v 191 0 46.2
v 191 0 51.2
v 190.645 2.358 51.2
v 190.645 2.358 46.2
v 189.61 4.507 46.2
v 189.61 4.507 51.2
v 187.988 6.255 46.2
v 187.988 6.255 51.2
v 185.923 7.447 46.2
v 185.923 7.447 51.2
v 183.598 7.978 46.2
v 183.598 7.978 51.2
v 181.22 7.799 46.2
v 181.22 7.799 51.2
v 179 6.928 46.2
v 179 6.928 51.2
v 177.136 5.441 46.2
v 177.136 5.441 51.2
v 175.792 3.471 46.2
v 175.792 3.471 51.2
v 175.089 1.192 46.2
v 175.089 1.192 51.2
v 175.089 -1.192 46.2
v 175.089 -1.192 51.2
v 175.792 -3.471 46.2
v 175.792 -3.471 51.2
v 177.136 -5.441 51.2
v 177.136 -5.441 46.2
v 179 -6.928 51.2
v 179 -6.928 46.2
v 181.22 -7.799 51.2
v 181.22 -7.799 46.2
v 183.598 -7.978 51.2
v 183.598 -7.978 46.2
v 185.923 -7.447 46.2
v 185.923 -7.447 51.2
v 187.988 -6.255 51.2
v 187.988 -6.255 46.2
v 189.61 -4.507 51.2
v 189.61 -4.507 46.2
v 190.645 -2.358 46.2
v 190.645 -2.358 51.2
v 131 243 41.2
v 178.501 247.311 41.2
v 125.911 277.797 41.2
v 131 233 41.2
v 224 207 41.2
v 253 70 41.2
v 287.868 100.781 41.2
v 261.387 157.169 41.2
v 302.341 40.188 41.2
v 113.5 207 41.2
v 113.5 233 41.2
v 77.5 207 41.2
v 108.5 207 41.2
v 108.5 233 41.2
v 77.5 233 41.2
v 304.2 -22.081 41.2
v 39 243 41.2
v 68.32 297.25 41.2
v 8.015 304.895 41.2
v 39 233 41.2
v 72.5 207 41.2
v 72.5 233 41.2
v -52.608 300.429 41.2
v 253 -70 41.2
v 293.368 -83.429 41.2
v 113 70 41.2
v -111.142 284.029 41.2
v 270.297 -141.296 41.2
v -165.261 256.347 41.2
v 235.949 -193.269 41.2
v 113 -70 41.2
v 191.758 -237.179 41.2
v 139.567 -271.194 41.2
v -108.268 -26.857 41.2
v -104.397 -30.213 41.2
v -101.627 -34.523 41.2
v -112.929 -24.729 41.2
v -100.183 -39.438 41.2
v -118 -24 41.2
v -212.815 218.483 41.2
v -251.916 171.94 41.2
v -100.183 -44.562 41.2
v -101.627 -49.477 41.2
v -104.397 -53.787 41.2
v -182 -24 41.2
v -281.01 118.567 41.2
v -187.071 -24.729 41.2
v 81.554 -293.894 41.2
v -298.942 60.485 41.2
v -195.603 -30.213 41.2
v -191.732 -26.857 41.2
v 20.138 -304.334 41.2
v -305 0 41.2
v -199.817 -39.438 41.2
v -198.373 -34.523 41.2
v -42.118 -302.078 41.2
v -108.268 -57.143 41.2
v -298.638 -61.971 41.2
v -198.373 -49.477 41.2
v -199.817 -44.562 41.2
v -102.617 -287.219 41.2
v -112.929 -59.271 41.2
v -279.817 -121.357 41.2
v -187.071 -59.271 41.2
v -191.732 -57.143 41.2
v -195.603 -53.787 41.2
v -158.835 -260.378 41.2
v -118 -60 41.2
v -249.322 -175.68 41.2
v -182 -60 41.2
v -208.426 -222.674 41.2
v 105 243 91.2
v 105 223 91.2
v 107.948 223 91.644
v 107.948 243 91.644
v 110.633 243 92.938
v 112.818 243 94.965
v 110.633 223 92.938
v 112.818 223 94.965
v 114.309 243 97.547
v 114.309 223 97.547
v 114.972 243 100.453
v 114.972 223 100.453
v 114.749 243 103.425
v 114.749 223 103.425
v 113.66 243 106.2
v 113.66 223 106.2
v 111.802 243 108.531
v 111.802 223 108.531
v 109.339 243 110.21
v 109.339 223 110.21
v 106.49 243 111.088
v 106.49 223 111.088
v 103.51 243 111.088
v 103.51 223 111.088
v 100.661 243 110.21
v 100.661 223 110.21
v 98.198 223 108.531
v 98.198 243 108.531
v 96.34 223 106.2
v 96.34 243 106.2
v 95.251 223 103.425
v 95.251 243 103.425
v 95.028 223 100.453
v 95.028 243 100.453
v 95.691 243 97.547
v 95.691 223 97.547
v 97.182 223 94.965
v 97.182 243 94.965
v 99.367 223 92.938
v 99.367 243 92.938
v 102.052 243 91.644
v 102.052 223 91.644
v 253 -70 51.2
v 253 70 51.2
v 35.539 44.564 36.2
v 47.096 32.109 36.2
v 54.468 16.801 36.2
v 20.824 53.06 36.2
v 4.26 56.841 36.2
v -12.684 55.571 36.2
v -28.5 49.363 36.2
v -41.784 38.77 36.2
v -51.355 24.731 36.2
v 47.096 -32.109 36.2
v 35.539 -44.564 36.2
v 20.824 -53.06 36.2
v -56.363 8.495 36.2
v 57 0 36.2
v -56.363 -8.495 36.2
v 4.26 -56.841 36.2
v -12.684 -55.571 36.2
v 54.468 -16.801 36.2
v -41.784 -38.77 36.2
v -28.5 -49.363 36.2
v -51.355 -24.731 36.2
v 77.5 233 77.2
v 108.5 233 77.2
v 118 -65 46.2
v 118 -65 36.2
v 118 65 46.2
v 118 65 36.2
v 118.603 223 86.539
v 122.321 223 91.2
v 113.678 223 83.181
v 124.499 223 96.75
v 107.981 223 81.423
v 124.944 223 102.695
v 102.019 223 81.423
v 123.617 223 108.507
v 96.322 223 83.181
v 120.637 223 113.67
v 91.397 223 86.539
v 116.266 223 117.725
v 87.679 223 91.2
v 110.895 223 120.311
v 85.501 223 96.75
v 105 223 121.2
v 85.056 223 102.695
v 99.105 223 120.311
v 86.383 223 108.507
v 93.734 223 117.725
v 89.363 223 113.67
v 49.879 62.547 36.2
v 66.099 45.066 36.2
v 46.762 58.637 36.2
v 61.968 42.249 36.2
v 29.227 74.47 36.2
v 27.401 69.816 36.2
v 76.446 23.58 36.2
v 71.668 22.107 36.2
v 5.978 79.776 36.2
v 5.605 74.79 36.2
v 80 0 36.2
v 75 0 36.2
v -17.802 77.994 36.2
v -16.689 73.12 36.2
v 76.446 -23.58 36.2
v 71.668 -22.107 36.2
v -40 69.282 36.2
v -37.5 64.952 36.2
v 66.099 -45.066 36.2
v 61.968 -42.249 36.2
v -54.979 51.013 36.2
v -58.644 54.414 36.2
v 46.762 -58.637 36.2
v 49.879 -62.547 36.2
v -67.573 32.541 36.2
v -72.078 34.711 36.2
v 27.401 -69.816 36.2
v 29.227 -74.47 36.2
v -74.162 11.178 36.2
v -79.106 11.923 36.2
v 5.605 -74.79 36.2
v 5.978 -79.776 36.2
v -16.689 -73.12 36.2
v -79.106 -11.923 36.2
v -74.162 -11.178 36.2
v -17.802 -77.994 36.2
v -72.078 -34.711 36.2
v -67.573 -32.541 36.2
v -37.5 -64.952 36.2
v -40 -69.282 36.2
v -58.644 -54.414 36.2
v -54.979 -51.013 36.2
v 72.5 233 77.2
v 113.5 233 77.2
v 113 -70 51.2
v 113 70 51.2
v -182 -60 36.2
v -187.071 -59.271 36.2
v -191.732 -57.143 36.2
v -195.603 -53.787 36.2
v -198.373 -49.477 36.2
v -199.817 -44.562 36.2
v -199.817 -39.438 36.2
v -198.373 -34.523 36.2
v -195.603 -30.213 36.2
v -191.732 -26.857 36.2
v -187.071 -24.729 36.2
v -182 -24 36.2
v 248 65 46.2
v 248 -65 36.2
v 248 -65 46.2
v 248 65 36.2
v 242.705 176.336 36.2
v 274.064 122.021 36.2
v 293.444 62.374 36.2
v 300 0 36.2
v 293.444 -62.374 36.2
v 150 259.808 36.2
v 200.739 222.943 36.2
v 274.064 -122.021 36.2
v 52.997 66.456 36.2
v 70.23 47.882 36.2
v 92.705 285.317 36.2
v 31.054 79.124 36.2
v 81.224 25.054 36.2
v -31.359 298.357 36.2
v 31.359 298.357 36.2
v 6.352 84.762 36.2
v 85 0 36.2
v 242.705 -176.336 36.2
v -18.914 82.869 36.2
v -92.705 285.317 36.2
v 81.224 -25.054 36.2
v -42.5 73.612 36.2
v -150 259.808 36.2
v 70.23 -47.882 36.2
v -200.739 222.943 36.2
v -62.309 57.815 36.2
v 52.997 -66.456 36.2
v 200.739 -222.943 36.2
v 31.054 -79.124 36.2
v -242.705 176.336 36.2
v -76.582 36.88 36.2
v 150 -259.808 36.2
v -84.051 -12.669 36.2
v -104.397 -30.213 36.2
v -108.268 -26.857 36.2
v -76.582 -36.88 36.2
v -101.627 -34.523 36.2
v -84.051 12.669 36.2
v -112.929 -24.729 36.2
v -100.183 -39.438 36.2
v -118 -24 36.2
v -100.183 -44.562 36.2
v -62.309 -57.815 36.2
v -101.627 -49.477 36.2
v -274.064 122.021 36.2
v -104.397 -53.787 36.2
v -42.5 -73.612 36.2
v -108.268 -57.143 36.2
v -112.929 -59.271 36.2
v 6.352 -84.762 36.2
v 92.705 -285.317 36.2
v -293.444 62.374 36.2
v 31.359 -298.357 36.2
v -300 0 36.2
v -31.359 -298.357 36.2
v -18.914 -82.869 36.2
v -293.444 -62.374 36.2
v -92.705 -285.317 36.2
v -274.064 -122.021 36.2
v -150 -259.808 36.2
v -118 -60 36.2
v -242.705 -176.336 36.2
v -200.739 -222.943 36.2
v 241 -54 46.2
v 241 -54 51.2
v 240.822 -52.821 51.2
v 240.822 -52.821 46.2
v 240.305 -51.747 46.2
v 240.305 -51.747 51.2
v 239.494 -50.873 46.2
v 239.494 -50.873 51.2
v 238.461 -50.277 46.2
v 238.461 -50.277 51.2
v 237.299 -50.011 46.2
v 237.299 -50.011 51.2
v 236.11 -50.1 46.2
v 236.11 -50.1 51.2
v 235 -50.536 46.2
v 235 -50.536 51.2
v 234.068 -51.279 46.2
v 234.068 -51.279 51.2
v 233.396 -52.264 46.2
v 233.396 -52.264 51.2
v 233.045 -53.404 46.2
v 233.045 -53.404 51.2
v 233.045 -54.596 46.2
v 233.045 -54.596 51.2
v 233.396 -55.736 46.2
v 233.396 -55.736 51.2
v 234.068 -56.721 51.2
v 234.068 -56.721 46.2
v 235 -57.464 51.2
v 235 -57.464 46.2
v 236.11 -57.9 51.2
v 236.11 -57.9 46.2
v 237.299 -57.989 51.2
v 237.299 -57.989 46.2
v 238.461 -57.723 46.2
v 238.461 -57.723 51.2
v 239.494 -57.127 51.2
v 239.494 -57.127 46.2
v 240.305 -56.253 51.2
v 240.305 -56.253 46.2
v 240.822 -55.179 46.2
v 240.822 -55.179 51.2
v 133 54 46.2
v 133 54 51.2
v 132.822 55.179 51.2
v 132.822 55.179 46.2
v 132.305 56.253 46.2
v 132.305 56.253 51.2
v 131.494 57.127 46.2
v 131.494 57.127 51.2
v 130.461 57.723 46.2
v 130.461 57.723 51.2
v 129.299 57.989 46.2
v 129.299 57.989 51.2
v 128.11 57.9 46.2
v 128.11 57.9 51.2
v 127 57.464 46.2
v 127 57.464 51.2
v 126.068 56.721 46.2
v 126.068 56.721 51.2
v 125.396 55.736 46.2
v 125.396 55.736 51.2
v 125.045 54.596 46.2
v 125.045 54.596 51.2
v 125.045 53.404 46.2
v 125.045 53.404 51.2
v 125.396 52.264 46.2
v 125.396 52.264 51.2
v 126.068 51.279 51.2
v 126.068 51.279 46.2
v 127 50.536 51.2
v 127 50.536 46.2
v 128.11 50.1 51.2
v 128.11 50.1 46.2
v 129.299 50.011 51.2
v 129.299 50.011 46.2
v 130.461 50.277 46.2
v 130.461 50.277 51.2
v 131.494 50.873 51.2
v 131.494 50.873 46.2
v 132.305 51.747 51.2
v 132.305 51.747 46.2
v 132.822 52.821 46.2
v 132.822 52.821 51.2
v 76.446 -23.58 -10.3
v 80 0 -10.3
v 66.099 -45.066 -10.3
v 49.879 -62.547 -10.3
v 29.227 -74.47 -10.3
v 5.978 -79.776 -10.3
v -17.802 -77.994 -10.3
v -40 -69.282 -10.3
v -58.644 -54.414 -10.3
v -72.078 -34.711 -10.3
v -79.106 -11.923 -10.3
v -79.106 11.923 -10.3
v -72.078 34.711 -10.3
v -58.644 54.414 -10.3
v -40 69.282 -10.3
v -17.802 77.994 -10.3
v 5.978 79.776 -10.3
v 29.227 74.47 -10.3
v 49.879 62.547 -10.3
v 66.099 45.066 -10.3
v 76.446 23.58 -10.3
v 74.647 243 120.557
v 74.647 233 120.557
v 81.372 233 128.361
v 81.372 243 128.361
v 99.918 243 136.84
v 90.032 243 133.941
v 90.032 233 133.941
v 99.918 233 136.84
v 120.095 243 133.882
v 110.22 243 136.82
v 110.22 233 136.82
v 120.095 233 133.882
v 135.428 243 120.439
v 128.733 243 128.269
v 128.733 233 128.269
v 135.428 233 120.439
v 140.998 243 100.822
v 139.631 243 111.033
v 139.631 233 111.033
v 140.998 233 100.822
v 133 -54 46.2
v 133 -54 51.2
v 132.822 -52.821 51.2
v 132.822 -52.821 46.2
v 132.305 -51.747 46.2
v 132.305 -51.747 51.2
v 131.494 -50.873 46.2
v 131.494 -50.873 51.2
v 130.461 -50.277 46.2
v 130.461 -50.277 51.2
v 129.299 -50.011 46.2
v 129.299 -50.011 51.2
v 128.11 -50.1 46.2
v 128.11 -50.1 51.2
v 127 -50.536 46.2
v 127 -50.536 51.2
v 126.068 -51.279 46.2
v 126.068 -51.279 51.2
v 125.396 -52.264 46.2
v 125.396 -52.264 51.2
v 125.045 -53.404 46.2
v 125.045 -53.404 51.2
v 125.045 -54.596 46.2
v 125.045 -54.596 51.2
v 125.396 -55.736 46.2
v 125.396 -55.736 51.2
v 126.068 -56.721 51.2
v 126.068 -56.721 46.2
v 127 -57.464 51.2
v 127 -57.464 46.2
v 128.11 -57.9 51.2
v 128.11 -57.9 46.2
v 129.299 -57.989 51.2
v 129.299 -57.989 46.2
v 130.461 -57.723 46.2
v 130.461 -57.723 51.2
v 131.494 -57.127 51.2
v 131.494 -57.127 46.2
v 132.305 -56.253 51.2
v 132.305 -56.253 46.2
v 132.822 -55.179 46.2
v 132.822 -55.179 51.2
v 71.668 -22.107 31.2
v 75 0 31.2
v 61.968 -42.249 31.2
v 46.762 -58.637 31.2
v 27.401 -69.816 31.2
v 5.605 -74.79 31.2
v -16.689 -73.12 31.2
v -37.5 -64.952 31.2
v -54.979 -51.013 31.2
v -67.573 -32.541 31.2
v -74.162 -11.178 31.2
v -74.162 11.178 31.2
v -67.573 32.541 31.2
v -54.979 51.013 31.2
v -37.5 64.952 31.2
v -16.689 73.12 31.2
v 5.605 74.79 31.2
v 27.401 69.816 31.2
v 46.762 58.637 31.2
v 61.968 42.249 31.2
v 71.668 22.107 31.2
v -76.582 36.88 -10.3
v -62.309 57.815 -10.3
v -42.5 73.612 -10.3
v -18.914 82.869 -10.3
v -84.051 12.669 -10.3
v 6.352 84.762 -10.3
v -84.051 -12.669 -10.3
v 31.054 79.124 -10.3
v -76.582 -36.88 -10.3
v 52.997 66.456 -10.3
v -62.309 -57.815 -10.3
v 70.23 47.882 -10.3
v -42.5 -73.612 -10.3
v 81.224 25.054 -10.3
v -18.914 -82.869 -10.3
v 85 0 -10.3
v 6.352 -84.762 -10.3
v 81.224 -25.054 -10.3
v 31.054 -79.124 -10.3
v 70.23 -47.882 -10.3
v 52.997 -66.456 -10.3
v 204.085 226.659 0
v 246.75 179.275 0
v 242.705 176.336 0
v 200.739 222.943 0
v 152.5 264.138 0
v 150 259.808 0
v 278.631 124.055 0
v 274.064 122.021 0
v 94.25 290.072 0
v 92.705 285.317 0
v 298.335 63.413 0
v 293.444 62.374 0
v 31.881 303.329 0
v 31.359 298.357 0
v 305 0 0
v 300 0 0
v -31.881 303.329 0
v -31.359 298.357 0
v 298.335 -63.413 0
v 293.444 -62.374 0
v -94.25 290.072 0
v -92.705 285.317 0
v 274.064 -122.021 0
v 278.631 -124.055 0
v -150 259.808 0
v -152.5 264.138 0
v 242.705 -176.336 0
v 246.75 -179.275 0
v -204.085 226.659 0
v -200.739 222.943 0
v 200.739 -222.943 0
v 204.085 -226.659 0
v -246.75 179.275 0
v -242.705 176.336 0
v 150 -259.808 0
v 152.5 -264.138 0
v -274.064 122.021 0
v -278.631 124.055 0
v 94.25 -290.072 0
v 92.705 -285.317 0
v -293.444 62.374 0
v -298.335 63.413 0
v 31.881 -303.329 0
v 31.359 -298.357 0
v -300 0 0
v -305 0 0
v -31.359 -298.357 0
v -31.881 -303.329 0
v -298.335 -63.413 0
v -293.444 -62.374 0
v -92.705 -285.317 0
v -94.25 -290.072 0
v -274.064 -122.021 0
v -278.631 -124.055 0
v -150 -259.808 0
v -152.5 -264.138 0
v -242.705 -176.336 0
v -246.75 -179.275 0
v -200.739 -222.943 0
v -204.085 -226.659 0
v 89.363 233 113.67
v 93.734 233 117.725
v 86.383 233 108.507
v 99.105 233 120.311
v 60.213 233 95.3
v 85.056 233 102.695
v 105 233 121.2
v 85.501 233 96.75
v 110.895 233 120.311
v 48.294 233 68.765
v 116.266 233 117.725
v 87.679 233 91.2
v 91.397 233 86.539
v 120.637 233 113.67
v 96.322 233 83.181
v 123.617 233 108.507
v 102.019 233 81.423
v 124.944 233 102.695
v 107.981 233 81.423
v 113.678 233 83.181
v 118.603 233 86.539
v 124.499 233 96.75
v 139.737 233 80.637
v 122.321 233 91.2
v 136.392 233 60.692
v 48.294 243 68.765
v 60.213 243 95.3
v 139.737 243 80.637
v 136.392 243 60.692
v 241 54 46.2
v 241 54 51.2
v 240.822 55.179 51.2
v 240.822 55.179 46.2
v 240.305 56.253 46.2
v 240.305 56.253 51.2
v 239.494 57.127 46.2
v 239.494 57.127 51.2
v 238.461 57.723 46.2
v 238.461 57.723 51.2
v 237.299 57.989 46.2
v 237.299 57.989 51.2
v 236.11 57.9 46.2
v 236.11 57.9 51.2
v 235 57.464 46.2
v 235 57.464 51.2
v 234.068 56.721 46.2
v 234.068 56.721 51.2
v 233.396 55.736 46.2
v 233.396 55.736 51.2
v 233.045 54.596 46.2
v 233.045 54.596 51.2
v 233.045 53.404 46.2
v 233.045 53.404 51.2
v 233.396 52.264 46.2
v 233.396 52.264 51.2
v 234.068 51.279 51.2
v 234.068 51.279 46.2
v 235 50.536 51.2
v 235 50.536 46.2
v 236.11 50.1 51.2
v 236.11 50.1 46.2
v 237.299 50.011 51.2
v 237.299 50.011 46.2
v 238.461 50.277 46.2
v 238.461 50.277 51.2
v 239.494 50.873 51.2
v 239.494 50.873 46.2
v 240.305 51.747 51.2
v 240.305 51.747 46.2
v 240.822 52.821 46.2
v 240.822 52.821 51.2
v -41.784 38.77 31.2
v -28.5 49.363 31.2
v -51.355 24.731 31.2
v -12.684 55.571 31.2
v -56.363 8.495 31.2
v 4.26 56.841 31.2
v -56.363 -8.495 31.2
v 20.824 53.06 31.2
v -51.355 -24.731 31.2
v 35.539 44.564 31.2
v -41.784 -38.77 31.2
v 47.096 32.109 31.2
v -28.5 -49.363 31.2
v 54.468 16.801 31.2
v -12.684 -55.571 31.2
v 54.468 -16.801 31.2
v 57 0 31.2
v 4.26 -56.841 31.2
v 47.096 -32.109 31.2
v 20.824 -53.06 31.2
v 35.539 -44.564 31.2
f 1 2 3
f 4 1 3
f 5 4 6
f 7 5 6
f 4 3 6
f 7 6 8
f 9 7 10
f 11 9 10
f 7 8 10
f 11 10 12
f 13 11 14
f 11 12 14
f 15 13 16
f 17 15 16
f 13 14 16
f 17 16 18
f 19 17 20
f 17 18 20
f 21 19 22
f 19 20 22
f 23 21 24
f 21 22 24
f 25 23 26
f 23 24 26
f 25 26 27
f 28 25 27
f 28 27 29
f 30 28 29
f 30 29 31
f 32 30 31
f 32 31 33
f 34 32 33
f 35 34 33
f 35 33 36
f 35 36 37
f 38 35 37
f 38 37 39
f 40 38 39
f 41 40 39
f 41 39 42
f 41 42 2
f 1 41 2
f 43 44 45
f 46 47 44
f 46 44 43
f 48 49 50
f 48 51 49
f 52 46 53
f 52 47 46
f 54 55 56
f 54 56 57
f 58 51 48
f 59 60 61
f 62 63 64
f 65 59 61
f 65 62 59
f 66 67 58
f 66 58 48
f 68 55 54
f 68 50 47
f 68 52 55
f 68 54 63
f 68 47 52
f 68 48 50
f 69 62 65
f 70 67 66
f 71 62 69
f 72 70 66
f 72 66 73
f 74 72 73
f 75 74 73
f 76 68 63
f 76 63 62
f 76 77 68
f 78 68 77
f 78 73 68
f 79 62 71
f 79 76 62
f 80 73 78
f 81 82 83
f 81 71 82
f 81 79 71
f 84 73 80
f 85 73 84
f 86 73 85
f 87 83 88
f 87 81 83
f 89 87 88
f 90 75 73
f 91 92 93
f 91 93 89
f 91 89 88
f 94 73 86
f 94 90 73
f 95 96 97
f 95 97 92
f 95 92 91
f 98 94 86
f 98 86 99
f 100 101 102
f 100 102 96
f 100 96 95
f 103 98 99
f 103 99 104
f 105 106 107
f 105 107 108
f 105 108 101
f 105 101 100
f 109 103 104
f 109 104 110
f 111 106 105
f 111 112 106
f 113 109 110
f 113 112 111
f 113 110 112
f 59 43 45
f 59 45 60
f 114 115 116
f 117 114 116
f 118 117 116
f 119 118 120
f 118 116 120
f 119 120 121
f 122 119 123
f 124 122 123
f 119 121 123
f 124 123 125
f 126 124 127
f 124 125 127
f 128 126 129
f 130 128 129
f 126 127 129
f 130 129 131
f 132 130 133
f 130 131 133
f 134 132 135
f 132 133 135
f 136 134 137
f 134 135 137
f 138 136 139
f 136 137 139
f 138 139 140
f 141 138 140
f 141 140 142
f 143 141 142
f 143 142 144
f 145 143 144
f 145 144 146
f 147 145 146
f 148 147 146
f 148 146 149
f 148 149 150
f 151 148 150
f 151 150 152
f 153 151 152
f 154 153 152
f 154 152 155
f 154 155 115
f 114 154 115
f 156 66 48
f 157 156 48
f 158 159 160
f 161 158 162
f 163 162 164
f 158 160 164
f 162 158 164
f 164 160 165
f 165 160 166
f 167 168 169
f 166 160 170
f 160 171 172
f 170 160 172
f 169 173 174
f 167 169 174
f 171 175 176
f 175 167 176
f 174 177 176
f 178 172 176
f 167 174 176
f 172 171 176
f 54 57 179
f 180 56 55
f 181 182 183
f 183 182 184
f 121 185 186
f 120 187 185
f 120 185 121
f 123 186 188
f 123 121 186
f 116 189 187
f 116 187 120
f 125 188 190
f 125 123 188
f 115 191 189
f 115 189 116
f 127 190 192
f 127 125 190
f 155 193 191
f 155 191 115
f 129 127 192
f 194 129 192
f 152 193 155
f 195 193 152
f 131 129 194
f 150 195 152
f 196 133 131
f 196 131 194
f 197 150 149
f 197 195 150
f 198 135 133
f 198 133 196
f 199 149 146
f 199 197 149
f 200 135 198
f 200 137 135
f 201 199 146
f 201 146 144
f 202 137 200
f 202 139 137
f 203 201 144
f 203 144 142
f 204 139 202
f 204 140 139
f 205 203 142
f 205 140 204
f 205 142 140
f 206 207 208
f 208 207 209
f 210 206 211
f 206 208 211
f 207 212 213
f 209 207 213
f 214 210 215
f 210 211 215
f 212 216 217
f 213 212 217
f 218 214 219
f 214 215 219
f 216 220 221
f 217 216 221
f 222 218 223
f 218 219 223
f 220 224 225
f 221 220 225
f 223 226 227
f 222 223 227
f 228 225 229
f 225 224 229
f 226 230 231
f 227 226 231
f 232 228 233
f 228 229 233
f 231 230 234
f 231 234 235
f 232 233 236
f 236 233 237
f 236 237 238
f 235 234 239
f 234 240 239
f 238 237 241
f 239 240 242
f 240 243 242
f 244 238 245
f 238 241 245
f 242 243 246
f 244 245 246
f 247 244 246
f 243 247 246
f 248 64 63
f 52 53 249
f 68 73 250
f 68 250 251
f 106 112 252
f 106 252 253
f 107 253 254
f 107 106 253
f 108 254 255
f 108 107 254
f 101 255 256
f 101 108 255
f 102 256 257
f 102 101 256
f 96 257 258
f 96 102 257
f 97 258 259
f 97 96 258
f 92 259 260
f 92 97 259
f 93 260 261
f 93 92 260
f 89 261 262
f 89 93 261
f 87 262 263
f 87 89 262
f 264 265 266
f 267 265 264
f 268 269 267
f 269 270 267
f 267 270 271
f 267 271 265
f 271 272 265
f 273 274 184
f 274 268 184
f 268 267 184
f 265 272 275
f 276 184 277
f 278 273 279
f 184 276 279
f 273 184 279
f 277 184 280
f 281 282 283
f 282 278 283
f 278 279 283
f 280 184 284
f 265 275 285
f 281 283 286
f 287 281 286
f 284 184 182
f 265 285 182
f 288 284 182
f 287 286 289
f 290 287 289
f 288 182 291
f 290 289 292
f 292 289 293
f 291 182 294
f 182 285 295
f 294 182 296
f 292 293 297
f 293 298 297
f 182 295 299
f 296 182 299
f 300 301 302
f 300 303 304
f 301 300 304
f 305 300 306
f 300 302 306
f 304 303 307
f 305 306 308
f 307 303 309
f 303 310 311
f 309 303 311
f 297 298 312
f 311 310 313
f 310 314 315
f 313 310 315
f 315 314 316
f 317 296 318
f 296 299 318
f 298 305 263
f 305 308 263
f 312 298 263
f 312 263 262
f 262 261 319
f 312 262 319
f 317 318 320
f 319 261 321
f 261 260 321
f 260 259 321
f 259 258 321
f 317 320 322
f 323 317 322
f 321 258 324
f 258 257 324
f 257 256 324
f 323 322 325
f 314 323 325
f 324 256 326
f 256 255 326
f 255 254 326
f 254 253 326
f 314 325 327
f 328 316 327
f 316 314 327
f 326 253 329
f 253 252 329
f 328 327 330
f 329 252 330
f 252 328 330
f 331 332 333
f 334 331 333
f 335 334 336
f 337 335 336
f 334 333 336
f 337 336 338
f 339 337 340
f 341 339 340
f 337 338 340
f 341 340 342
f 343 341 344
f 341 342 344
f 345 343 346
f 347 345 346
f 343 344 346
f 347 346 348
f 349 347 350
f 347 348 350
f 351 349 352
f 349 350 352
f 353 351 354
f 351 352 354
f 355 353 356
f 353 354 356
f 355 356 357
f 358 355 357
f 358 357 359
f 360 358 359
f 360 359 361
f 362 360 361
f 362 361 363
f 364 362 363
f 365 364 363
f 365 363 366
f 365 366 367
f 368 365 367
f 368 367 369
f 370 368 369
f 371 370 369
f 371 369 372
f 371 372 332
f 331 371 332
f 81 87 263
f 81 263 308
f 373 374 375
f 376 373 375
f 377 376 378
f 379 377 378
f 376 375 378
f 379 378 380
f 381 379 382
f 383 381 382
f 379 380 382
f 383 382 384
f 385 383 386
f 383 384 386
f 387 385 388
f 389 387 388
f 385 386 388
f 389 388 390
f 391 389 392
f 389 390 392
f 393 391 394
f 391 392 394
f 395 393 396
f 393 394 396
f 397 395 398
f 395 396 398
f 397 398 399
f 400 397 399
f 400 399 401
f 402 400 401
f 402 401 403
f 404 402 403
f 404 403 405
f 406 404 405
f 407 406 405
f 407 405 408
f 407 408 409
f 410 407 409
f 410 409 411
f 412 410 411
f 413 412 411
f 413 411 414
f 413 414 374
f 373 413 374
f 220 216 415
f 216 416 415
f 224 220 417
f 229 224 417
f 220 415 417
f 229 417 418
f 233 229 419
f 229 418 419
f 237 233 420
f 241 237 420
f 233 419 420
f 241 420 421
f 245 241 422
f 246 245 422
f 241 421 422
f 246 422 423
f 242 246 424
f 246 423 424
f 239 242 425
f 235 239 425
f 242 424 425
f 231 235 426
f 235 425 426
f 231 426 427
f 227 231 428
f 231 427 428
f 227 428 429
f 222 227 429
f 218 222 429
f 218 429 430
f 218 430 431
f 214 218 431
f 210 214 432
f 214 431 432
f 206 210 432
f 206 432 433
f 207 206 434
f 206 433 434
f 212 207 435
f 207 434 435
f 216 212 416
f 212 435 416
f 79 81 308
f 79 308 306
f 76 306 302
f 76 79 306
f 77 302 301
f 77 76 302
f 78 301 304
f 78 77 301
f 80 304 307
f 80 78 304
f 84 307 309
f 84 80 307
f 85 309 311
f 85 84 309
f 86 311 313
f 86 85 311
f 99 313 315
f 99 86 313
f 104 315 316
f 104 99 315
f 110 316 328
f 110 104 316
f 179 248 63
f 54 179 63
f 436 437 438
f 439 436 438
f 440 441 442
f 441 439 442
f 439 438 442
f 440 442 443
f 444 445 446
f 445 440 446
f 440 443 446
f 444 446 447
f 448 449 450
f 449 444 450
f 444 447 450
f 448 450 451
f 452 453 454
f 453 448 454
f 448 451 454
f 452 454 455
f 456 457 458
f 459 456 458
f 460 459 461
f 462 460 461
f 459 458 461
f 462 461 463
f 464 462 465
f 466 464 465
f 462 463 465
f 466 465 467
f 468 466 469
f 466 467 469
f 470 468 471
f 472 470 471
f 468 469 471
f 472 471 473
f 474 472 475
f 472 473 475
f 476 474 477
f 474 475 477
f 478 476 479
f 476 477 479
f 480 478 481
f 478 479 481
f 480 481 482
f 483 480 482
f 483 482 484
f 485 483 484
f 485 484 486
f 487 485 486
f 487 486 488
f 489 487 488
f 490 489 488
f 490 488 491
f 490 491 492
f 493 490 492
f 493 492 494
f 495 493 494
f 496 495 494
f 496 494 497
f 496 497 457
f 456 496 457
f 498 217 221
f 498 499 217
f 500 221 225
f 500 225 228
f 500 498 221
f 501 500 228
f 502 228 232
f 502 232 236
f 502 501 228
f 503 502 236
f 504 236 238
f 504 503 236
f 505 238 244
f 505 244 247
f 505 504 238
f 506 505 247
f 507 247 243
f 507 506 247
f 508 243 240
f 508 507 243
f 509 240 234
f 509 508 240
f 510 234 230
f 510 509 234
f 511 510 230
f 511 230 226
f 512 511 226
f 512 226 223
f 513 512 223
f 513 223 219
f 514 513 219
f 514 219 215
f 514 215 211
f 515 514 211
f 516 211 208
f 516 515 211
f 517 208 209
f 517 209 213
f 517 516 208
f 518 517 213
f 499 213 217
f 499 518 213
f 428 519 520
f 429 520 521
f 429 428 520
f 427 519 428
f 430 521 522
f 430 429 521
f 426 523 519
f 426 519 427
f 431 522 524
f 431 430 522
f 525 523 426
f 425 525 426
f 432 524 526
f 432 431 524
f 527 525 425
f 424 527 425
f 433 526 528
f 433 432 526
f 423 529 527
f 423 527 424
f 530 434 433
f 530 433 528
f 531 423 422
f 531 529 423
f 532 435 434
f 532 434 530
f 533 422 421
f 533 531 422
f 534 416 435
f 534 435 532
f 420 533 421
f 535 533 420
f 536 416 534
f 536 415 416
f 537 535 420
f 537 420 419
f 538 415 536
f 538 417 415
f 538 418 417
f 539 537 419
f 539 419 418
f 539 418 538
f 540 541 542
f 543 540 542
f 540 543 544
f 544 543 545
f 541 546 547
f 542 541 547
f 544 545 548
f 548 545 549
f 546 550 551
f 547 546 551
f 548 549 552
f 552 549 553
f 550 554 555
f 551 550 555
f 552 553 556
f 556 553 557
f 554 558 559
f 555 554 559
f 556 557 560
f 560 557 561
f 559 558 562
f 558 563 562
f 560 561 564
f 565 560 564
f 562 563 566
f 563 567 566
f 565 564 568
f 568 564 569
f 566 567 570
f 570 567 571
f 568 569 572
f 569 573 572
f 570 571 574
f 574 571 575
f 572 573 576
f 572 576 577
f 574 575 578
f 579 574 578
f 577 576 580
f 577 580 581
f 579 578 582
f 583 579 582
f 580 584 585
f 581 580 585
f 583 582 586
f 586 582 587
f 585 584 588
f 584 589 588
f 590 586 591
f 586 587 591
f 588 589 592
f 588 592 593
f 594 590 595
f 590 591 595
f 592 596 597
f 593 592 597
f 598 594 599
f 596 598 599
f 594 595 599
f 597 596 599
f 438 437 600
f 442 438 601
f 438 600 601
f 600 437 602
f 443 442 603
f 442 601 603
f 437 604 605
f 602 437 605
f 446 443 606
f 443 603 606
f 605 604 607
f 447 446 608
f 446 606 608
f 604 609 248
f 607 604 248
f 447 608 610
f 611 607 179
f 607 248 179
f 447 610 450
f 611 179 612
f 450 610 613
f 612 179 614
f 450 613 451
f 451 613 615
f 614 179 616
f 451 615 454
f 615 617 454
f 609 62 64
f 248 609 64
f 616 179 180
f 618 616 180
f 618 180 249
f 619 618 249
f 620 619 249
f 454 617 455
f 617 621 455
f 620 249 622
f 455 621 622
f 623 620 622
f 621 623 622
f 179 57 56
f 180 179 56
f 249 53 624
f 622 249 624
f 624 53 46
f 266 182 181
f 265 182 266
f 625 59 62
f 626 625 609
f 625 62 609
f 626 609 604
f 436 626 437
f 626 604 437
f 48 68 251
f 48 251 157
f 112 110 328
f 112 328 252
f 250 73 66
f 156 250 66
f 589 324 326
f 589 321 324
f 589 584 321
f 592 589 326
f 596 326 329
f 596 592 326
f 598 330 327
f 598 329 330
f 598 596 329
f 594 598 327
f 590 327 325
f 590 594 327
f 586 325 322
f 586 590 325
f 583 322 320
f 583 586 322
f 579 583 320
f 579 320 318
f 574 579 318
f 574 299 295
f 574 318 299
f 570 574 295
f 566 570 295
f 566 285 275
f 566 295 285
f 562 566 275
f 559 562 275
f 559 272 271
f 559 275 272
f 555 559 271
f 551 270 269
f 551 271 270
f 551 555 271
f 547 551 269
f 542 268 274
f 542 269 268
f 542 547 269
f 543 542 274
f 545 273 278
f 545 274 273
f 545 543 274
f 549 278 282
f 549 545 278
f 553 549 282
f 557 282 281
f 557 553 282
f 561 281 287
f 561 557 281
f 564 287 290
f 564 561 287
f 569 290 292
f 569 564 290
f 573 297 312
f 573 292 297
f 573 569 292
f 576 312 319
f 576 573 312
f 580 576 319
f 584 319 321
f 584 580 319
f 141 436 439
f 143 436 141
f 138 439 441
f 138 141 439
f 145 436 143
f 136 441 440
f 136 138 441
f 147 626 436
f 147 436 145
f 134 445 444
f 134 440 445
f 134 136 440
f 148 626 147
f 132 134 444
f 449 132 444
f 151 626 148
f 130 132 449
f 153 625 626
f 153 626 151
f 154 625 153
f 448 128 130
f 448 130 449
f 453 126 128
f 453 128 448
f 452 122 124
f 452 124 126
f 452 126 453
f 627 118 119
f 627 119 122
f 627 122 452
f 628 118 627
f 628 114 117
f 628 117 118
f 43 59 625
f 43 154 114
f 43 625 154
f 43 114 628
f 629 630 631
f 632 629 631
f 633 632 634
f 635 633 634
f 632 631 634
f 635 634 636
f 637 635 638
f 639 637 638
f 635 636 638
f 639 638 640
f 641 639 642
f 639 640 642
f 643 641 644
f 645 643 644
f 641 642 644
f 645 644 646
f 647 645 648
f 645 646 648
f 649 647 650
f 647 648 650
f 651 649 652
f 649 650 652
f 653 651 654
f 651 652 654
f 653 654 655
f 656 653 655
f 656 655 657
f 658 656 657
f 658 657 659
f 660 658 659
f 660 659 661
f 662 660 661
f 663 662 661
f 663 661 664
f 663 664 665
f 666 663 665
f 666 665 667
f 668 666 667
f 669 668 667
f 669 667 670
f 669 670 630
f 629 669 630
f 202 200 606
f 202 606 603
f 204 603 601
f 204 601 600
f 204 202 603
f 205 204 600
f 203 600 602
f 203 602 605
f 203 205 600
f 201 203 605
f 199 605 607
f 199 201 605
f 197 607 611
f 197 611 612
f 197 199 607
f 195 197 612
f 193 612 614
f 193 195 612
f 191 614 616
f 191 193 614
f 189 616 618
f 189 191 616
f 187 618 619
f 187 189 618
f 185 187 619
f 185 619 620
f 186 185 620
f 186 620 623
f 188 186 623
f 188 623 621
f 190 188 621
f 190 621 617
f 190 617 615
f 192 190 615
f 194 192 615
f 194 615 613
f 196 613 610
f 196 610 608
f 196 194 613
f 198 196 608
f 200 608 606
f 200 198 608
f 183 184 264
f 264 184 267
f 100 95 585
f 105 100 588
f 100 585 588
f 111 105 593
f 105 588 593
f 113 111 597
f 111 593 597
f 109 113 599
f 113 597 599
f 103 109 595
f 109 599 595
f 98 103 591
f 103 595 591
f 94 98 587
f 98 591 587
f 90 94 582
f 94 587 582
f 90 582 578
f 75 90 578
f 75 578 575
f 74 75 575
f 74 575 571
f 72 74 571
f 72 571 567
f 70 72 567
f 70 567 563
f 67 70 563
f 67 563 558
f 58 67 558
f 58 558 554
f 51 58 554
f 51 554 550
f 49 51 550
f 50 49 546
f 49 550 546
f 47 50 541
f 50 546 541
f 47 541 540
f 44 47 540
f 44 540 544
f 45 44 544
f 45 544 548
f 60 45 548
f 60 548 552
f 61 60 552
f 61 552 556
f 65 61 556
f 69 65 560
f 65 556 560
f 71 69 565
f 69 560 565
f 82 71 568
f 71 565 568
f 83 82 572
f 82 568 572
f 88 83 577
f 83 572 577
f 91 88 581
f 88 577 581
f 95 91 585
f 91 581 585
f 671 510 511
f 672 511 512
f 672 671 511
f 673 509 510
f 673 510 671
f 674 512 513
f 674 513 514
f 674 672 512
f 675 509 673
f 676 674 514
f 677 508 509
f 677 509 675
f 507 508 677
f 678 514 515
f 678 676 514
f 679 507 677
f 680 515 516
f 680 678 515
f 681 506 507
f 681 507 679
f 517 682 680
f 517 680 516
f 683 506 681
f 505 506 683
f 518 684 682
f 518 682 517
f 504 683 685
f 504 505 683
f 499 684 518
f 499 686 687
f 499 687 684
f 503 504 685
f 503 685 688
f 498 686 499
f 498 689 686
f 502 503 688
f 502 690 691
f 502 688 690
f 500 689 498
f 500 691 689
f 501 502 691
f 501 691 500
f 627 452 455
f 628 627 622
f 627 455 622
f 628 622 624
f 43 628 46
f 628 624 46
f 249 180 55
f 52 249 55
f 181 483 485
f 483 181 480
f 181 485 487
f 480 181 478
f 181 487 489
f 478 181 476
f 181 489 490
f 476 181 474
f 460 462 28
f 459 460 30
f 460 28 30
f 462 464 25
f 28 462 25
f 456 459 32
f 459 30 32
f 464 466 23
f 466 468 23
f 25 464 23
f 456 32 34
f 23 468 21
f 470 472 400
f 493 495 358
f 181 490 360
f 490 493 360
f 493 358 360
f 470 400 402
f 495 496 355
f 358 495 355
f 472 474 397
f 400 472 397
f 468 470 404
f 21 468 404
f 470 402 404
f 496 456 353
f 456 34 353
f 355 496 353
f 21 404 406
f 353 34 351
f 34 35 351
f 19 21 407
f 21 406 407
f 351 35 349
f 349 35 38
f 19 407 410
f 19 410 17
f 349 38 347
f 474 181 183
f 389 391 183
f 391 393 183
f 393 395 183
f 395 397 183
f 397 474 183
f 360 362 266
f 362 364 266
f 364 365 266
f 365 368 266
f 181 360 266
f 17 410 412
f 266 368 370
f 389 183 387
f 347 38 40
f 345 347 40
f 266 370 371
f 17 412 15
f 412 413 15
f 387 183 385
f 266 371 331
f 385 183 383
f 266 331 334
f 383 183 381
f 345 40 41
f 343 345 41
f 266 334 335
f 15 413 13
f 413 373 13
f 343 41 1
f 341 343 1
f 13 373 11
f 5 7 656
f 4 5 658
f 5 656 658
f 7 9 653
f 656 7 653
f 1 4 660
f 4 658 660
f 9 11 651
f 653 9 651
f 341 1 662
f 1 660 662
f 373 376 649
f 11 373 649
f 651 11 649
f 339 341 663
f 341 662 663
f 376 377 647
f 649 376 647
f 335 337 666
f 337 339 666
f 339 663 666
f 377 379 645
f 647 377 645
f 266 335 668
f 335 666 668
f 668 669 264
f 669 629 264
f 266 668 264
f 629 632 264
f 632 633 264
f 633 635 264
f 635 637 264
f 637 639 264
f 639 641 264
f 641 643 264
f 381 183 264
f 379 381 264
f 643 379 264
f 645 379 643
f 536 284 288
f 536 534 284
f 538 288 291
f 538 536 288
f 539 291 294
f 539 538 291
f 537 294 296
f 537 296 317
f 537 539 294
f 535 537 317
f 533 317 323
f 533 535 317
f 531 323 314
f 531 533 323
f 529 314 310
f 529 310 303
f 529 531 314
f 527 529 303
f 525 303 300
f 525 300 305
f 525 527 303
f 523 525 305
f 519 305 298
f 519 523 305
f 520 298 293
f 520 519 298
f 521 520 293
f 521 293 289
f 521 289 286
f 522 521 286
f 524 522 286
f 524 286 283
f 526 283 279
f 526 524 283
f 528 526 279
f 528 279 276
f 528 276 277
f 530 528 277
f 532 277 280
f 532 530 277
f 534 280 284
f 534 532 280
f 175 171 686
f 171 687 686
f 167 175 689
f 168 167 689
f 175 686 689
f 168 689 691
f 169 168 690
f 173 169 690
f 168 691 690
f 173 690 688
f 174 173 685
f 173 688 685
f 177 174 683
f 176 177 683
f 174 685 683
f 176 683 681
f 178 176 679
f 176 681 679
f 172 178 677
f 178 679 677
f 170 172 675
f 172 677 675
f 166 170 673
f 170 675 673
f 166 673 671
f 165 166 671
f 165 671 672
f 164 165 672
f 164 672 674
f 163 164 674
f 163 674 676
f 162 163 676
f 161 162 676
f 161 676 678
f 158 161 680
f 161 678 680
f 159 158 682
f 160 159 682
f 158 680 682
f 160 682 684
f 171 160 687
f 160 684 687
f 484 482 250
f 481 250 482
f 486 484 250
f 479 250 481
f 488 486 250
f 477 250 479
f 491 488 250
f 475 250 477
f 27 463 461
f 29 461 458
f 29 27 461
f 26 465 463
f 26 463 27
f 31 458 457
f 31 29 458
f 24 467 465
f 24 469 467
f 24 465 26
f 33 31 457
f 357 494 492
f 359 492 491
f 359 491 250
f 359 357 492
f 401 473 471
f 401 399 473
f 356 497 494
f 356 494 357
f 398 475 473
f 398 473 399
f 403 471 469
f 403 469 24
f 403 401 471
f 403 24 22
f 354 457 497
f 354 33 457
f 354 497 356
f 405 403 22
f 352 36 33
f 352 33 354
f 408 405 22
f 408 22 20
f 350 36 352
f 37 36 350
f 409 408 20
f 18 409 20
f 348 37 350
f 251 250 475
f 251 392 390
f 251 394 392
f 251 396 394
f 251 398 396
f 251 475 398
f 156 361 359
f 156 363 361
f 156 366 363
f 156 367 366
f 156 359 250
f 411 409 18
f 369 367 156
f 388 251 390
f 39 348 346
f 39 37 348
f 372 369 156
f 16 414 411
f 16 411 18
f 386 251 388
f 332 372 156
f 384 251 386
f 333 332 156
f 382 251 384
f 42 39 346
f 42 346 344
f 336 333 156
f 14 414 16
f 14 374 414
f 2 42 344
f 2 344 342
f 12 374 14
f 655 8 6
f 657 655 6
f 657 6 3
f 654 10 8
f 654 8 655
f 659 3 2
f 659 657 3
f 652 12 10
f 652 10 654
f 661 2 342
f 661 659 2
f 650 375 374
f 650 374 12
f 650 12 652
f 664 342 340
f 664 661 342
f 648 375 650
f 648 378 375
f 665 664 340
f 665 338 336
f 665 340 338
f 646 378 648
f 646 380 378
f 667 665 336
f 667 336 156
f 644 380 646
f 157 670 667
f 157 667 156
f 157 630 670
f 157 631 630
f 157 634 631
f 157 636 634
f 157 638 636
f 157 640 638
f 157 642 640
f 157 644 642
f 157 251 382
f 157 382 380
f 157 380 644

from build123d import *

# Parameters (mm, degrees)
SKETCH_1_R          = 305
EXTRUDE_1_DEPTH     = 41.2
SKETCH_2_W          = 140
SKETCH_2_H          = 140
EXTRUDE_2_DEPTH     = 10
SHELL_1_T           = -5
CUT_EXTRUDE_1_DEPTH = 10
SKETCH_4_W          = 120
SKETCH_4_H          = 10
EXTRUDE_3_DEPTH     = 150
CUT_EXTRUDE_2_DEPTH = 648.322516216
SKETCH_7_R          = 10
CUT_EXTRUDE_3_DEPTH = 150
EXTRUDE_START       = 10
SKETCH_8_R          = 20
SKETCH_8_R_2        = 10
EXTRUDE_4_DEPTH     = 10
SKETCH_9_W          = 5
SKETCH_9_H          = 36
EXTRUDE_5_DEPTH     = 26
CUT_EXTRUDE_4_DEPTH = 505.336286618
SKETCH_11_W         = 18
SKETCH_11_H         = 5
SKETCH_11_W_2       = 5
SKETCH_11_H_2       = 46.5
SKETCH_12_R         = 4
SKETCH_12_R_2       = 8
CUT_EXTRUDE_5_DEPTH = 26


with BuildPart() as part:
    # 草图1 → 凸台-拉伸1 (new body)
    with BuildSketch(Plane.XY):
        with Locations(Location((0, 0, 0), (0, 0, 180))):
            Circle(SKETCH_1_R)
    extrude(amount=EXTRUDE_1_DEPTH)

    # 草图2 → 凸台-拉伸2 (add)
    with BuildSketch(Plane.XY.offset(41.2)):
        with Locations((183, 0)):
            Rectangle(SKETCH_2_W, SKETCH_2_H)
    extrude(amount=EXTRUDE_2_DEPTH)

    # 抽壳1
    shell_1_openings = [part.faces().sort_by_distance(p)[0] for p in [
        (0, 0, 0),
    ]]
    offset(amount=SHELL_1_T, openings=shell_1_openings, kind=Kind.INTERSECTION)

    # 草图3 → 切除-拉伸1 (cut)
    with BuildSketch(Plane.XY.offset(41.2)):
        with BuildLine():
            Line((-182, -24), (-118, -24))
            ThreePointArc((-118, -24), (-100, -42), (-118, -60))
            Line((-118, -60), (-182, -60))
            ThreePointArc((-182, -60), (-200, -42), (-182, -24))
        make_face()
    extrude(amount=-CUT_EXTRUDE_1_DEPTH, mode=Mode.SUBTRACT)

    # 草图4 → 凸台-拉伸3 (add)
    with BuildSketch(Plane.XY.offset(41.2)):
        with Locations((99, 238)):
            Rectangle(SKETCH_4_W, SKETCH_4_H)
    extrude(amount=EXTRUDE_3_DEPTH)

    # 草图6 → 切除-拉伸2 (cut, through all)
    with BuildSketch(Plane.XZ.offset(-233)):
        with BuildLine():
            Line((39, 191.2), (39, 41.2))
            ThreePointArc((39, 41.2), (53.931588882, 82.177347592), (74.646786984, 120.556716136))
            ThreePointArc((74.646786984, 120.556716136), (115.26317996, 135.706044936), (140.99801314, 100.821780537))
            ThreePointArc((140.99801314, 100.821780537), (138.32356193, 70.621084147), (131, 41.2))
            Line((131, 41.2), (159, 41.2))
            Line((159, 41.2), (159, 191.2))
            Line((159, 191.2), (39, 191.2))
        make_face()
    extrude(amount=-CUT_EXTRUDE_2_DEPTH, mode=Mode.SUBTRACT)

    # 草图7 → 切除-拉伸3 (cut)
    with BuildSketch(Plane.XZ.offset(-233)):
        with Locations(Location((105, 101.2, 0), (0, 0, 270))):
            Circle(SKETCH_7_R)
    extrude(amount=-CUT_EXTRUDE_3_DEPTH, mode=Mode.SUBTRACT)

    # 草图8 → 凸台-拉伸4 (add)
    with BuildSketch(Plane.XZ.offset(-233).offset(EXTRUDE_START)):
        with Locations(Location((105, 101.2, 0), (0, 0, 90))):
            Circle(SKETCH_8_R)
        with Locations(Location((105, 101.2, 0), (0, 0, 270))):
            Circle(SKETCH_8_R_2, mode=Mode.SUBTRACT)
    extrude(amount=-EXTRUDE_4_DEPTH)

    # 草图9 → 凸台-拉伸5 (add)
    with BuildSketch(Plane.XZ.offset(-233)):
        with Locations((75, 59.2)):
            Rectangle(SKETCH_9_W, SKETCH_9_H)
        with Locations((111, 59.2)):
            Rectangle(SKETCH_9_W, SKETCH_9_H)
    extrude(amount=EXTRUDE_5_DEPTH)

    # 草图10 → 切除-拉伸4 (cut, through all)
    with BuildSketch(Plane.ZY.offset(-72.5)):
        Polygon((77.2, 233), (41.2, 207), (77.2, 207), align=None)
    extrude(amount=-CUT_EXTRUDE_4_DEPTH, mode=Mode.SUBTRACT)

    # 草图11 → 旋转1 (revolve)
    with BuildSketch(Plane(origin=(0, 0, 0), x_dir=(1, 0, 0), z_dir=(0, 1, 0)), mode=Mode.PRIVATE) as revolve_1_sk:
        with Locations((-66, -33.7)):
            Rectangle(SKETCH_11_W, SKETCH_11_H)
        with Locations((-82.5, -12.95)):
            Rectangle(SKETCH_11_W_2, SKETCH_11_H_2)
    revolve(revolve_1_sk.sketch.rotate(Axis((0, 0, 0), (0, 0, -1)), 180), axis=Axis((0, 0, 0), (0, 0, -1)))

    # 草图12 → 切除-拉伸5 (cut)
    with BuildSketch(Plane.XY.offset(51.2)):
        with Locations((237, 54)):
            Circle(SKETCH_12_R)
        with Locations((237, -54)):
            Circle(SKETCH_12_R)
        with Locations((129, -54)):
            Circle(SKETCH_12_R)
        with Locations((129, 54)):
            Circle(SKETCH_12_R)
        with Locations((183, 0)):
            Circle(SKETCH_12_R_2)
    extrude(amount=-CUT_EXTRUDE_5_DEPTH, mode=Mode.SUBTRACT)


solid = part.part
